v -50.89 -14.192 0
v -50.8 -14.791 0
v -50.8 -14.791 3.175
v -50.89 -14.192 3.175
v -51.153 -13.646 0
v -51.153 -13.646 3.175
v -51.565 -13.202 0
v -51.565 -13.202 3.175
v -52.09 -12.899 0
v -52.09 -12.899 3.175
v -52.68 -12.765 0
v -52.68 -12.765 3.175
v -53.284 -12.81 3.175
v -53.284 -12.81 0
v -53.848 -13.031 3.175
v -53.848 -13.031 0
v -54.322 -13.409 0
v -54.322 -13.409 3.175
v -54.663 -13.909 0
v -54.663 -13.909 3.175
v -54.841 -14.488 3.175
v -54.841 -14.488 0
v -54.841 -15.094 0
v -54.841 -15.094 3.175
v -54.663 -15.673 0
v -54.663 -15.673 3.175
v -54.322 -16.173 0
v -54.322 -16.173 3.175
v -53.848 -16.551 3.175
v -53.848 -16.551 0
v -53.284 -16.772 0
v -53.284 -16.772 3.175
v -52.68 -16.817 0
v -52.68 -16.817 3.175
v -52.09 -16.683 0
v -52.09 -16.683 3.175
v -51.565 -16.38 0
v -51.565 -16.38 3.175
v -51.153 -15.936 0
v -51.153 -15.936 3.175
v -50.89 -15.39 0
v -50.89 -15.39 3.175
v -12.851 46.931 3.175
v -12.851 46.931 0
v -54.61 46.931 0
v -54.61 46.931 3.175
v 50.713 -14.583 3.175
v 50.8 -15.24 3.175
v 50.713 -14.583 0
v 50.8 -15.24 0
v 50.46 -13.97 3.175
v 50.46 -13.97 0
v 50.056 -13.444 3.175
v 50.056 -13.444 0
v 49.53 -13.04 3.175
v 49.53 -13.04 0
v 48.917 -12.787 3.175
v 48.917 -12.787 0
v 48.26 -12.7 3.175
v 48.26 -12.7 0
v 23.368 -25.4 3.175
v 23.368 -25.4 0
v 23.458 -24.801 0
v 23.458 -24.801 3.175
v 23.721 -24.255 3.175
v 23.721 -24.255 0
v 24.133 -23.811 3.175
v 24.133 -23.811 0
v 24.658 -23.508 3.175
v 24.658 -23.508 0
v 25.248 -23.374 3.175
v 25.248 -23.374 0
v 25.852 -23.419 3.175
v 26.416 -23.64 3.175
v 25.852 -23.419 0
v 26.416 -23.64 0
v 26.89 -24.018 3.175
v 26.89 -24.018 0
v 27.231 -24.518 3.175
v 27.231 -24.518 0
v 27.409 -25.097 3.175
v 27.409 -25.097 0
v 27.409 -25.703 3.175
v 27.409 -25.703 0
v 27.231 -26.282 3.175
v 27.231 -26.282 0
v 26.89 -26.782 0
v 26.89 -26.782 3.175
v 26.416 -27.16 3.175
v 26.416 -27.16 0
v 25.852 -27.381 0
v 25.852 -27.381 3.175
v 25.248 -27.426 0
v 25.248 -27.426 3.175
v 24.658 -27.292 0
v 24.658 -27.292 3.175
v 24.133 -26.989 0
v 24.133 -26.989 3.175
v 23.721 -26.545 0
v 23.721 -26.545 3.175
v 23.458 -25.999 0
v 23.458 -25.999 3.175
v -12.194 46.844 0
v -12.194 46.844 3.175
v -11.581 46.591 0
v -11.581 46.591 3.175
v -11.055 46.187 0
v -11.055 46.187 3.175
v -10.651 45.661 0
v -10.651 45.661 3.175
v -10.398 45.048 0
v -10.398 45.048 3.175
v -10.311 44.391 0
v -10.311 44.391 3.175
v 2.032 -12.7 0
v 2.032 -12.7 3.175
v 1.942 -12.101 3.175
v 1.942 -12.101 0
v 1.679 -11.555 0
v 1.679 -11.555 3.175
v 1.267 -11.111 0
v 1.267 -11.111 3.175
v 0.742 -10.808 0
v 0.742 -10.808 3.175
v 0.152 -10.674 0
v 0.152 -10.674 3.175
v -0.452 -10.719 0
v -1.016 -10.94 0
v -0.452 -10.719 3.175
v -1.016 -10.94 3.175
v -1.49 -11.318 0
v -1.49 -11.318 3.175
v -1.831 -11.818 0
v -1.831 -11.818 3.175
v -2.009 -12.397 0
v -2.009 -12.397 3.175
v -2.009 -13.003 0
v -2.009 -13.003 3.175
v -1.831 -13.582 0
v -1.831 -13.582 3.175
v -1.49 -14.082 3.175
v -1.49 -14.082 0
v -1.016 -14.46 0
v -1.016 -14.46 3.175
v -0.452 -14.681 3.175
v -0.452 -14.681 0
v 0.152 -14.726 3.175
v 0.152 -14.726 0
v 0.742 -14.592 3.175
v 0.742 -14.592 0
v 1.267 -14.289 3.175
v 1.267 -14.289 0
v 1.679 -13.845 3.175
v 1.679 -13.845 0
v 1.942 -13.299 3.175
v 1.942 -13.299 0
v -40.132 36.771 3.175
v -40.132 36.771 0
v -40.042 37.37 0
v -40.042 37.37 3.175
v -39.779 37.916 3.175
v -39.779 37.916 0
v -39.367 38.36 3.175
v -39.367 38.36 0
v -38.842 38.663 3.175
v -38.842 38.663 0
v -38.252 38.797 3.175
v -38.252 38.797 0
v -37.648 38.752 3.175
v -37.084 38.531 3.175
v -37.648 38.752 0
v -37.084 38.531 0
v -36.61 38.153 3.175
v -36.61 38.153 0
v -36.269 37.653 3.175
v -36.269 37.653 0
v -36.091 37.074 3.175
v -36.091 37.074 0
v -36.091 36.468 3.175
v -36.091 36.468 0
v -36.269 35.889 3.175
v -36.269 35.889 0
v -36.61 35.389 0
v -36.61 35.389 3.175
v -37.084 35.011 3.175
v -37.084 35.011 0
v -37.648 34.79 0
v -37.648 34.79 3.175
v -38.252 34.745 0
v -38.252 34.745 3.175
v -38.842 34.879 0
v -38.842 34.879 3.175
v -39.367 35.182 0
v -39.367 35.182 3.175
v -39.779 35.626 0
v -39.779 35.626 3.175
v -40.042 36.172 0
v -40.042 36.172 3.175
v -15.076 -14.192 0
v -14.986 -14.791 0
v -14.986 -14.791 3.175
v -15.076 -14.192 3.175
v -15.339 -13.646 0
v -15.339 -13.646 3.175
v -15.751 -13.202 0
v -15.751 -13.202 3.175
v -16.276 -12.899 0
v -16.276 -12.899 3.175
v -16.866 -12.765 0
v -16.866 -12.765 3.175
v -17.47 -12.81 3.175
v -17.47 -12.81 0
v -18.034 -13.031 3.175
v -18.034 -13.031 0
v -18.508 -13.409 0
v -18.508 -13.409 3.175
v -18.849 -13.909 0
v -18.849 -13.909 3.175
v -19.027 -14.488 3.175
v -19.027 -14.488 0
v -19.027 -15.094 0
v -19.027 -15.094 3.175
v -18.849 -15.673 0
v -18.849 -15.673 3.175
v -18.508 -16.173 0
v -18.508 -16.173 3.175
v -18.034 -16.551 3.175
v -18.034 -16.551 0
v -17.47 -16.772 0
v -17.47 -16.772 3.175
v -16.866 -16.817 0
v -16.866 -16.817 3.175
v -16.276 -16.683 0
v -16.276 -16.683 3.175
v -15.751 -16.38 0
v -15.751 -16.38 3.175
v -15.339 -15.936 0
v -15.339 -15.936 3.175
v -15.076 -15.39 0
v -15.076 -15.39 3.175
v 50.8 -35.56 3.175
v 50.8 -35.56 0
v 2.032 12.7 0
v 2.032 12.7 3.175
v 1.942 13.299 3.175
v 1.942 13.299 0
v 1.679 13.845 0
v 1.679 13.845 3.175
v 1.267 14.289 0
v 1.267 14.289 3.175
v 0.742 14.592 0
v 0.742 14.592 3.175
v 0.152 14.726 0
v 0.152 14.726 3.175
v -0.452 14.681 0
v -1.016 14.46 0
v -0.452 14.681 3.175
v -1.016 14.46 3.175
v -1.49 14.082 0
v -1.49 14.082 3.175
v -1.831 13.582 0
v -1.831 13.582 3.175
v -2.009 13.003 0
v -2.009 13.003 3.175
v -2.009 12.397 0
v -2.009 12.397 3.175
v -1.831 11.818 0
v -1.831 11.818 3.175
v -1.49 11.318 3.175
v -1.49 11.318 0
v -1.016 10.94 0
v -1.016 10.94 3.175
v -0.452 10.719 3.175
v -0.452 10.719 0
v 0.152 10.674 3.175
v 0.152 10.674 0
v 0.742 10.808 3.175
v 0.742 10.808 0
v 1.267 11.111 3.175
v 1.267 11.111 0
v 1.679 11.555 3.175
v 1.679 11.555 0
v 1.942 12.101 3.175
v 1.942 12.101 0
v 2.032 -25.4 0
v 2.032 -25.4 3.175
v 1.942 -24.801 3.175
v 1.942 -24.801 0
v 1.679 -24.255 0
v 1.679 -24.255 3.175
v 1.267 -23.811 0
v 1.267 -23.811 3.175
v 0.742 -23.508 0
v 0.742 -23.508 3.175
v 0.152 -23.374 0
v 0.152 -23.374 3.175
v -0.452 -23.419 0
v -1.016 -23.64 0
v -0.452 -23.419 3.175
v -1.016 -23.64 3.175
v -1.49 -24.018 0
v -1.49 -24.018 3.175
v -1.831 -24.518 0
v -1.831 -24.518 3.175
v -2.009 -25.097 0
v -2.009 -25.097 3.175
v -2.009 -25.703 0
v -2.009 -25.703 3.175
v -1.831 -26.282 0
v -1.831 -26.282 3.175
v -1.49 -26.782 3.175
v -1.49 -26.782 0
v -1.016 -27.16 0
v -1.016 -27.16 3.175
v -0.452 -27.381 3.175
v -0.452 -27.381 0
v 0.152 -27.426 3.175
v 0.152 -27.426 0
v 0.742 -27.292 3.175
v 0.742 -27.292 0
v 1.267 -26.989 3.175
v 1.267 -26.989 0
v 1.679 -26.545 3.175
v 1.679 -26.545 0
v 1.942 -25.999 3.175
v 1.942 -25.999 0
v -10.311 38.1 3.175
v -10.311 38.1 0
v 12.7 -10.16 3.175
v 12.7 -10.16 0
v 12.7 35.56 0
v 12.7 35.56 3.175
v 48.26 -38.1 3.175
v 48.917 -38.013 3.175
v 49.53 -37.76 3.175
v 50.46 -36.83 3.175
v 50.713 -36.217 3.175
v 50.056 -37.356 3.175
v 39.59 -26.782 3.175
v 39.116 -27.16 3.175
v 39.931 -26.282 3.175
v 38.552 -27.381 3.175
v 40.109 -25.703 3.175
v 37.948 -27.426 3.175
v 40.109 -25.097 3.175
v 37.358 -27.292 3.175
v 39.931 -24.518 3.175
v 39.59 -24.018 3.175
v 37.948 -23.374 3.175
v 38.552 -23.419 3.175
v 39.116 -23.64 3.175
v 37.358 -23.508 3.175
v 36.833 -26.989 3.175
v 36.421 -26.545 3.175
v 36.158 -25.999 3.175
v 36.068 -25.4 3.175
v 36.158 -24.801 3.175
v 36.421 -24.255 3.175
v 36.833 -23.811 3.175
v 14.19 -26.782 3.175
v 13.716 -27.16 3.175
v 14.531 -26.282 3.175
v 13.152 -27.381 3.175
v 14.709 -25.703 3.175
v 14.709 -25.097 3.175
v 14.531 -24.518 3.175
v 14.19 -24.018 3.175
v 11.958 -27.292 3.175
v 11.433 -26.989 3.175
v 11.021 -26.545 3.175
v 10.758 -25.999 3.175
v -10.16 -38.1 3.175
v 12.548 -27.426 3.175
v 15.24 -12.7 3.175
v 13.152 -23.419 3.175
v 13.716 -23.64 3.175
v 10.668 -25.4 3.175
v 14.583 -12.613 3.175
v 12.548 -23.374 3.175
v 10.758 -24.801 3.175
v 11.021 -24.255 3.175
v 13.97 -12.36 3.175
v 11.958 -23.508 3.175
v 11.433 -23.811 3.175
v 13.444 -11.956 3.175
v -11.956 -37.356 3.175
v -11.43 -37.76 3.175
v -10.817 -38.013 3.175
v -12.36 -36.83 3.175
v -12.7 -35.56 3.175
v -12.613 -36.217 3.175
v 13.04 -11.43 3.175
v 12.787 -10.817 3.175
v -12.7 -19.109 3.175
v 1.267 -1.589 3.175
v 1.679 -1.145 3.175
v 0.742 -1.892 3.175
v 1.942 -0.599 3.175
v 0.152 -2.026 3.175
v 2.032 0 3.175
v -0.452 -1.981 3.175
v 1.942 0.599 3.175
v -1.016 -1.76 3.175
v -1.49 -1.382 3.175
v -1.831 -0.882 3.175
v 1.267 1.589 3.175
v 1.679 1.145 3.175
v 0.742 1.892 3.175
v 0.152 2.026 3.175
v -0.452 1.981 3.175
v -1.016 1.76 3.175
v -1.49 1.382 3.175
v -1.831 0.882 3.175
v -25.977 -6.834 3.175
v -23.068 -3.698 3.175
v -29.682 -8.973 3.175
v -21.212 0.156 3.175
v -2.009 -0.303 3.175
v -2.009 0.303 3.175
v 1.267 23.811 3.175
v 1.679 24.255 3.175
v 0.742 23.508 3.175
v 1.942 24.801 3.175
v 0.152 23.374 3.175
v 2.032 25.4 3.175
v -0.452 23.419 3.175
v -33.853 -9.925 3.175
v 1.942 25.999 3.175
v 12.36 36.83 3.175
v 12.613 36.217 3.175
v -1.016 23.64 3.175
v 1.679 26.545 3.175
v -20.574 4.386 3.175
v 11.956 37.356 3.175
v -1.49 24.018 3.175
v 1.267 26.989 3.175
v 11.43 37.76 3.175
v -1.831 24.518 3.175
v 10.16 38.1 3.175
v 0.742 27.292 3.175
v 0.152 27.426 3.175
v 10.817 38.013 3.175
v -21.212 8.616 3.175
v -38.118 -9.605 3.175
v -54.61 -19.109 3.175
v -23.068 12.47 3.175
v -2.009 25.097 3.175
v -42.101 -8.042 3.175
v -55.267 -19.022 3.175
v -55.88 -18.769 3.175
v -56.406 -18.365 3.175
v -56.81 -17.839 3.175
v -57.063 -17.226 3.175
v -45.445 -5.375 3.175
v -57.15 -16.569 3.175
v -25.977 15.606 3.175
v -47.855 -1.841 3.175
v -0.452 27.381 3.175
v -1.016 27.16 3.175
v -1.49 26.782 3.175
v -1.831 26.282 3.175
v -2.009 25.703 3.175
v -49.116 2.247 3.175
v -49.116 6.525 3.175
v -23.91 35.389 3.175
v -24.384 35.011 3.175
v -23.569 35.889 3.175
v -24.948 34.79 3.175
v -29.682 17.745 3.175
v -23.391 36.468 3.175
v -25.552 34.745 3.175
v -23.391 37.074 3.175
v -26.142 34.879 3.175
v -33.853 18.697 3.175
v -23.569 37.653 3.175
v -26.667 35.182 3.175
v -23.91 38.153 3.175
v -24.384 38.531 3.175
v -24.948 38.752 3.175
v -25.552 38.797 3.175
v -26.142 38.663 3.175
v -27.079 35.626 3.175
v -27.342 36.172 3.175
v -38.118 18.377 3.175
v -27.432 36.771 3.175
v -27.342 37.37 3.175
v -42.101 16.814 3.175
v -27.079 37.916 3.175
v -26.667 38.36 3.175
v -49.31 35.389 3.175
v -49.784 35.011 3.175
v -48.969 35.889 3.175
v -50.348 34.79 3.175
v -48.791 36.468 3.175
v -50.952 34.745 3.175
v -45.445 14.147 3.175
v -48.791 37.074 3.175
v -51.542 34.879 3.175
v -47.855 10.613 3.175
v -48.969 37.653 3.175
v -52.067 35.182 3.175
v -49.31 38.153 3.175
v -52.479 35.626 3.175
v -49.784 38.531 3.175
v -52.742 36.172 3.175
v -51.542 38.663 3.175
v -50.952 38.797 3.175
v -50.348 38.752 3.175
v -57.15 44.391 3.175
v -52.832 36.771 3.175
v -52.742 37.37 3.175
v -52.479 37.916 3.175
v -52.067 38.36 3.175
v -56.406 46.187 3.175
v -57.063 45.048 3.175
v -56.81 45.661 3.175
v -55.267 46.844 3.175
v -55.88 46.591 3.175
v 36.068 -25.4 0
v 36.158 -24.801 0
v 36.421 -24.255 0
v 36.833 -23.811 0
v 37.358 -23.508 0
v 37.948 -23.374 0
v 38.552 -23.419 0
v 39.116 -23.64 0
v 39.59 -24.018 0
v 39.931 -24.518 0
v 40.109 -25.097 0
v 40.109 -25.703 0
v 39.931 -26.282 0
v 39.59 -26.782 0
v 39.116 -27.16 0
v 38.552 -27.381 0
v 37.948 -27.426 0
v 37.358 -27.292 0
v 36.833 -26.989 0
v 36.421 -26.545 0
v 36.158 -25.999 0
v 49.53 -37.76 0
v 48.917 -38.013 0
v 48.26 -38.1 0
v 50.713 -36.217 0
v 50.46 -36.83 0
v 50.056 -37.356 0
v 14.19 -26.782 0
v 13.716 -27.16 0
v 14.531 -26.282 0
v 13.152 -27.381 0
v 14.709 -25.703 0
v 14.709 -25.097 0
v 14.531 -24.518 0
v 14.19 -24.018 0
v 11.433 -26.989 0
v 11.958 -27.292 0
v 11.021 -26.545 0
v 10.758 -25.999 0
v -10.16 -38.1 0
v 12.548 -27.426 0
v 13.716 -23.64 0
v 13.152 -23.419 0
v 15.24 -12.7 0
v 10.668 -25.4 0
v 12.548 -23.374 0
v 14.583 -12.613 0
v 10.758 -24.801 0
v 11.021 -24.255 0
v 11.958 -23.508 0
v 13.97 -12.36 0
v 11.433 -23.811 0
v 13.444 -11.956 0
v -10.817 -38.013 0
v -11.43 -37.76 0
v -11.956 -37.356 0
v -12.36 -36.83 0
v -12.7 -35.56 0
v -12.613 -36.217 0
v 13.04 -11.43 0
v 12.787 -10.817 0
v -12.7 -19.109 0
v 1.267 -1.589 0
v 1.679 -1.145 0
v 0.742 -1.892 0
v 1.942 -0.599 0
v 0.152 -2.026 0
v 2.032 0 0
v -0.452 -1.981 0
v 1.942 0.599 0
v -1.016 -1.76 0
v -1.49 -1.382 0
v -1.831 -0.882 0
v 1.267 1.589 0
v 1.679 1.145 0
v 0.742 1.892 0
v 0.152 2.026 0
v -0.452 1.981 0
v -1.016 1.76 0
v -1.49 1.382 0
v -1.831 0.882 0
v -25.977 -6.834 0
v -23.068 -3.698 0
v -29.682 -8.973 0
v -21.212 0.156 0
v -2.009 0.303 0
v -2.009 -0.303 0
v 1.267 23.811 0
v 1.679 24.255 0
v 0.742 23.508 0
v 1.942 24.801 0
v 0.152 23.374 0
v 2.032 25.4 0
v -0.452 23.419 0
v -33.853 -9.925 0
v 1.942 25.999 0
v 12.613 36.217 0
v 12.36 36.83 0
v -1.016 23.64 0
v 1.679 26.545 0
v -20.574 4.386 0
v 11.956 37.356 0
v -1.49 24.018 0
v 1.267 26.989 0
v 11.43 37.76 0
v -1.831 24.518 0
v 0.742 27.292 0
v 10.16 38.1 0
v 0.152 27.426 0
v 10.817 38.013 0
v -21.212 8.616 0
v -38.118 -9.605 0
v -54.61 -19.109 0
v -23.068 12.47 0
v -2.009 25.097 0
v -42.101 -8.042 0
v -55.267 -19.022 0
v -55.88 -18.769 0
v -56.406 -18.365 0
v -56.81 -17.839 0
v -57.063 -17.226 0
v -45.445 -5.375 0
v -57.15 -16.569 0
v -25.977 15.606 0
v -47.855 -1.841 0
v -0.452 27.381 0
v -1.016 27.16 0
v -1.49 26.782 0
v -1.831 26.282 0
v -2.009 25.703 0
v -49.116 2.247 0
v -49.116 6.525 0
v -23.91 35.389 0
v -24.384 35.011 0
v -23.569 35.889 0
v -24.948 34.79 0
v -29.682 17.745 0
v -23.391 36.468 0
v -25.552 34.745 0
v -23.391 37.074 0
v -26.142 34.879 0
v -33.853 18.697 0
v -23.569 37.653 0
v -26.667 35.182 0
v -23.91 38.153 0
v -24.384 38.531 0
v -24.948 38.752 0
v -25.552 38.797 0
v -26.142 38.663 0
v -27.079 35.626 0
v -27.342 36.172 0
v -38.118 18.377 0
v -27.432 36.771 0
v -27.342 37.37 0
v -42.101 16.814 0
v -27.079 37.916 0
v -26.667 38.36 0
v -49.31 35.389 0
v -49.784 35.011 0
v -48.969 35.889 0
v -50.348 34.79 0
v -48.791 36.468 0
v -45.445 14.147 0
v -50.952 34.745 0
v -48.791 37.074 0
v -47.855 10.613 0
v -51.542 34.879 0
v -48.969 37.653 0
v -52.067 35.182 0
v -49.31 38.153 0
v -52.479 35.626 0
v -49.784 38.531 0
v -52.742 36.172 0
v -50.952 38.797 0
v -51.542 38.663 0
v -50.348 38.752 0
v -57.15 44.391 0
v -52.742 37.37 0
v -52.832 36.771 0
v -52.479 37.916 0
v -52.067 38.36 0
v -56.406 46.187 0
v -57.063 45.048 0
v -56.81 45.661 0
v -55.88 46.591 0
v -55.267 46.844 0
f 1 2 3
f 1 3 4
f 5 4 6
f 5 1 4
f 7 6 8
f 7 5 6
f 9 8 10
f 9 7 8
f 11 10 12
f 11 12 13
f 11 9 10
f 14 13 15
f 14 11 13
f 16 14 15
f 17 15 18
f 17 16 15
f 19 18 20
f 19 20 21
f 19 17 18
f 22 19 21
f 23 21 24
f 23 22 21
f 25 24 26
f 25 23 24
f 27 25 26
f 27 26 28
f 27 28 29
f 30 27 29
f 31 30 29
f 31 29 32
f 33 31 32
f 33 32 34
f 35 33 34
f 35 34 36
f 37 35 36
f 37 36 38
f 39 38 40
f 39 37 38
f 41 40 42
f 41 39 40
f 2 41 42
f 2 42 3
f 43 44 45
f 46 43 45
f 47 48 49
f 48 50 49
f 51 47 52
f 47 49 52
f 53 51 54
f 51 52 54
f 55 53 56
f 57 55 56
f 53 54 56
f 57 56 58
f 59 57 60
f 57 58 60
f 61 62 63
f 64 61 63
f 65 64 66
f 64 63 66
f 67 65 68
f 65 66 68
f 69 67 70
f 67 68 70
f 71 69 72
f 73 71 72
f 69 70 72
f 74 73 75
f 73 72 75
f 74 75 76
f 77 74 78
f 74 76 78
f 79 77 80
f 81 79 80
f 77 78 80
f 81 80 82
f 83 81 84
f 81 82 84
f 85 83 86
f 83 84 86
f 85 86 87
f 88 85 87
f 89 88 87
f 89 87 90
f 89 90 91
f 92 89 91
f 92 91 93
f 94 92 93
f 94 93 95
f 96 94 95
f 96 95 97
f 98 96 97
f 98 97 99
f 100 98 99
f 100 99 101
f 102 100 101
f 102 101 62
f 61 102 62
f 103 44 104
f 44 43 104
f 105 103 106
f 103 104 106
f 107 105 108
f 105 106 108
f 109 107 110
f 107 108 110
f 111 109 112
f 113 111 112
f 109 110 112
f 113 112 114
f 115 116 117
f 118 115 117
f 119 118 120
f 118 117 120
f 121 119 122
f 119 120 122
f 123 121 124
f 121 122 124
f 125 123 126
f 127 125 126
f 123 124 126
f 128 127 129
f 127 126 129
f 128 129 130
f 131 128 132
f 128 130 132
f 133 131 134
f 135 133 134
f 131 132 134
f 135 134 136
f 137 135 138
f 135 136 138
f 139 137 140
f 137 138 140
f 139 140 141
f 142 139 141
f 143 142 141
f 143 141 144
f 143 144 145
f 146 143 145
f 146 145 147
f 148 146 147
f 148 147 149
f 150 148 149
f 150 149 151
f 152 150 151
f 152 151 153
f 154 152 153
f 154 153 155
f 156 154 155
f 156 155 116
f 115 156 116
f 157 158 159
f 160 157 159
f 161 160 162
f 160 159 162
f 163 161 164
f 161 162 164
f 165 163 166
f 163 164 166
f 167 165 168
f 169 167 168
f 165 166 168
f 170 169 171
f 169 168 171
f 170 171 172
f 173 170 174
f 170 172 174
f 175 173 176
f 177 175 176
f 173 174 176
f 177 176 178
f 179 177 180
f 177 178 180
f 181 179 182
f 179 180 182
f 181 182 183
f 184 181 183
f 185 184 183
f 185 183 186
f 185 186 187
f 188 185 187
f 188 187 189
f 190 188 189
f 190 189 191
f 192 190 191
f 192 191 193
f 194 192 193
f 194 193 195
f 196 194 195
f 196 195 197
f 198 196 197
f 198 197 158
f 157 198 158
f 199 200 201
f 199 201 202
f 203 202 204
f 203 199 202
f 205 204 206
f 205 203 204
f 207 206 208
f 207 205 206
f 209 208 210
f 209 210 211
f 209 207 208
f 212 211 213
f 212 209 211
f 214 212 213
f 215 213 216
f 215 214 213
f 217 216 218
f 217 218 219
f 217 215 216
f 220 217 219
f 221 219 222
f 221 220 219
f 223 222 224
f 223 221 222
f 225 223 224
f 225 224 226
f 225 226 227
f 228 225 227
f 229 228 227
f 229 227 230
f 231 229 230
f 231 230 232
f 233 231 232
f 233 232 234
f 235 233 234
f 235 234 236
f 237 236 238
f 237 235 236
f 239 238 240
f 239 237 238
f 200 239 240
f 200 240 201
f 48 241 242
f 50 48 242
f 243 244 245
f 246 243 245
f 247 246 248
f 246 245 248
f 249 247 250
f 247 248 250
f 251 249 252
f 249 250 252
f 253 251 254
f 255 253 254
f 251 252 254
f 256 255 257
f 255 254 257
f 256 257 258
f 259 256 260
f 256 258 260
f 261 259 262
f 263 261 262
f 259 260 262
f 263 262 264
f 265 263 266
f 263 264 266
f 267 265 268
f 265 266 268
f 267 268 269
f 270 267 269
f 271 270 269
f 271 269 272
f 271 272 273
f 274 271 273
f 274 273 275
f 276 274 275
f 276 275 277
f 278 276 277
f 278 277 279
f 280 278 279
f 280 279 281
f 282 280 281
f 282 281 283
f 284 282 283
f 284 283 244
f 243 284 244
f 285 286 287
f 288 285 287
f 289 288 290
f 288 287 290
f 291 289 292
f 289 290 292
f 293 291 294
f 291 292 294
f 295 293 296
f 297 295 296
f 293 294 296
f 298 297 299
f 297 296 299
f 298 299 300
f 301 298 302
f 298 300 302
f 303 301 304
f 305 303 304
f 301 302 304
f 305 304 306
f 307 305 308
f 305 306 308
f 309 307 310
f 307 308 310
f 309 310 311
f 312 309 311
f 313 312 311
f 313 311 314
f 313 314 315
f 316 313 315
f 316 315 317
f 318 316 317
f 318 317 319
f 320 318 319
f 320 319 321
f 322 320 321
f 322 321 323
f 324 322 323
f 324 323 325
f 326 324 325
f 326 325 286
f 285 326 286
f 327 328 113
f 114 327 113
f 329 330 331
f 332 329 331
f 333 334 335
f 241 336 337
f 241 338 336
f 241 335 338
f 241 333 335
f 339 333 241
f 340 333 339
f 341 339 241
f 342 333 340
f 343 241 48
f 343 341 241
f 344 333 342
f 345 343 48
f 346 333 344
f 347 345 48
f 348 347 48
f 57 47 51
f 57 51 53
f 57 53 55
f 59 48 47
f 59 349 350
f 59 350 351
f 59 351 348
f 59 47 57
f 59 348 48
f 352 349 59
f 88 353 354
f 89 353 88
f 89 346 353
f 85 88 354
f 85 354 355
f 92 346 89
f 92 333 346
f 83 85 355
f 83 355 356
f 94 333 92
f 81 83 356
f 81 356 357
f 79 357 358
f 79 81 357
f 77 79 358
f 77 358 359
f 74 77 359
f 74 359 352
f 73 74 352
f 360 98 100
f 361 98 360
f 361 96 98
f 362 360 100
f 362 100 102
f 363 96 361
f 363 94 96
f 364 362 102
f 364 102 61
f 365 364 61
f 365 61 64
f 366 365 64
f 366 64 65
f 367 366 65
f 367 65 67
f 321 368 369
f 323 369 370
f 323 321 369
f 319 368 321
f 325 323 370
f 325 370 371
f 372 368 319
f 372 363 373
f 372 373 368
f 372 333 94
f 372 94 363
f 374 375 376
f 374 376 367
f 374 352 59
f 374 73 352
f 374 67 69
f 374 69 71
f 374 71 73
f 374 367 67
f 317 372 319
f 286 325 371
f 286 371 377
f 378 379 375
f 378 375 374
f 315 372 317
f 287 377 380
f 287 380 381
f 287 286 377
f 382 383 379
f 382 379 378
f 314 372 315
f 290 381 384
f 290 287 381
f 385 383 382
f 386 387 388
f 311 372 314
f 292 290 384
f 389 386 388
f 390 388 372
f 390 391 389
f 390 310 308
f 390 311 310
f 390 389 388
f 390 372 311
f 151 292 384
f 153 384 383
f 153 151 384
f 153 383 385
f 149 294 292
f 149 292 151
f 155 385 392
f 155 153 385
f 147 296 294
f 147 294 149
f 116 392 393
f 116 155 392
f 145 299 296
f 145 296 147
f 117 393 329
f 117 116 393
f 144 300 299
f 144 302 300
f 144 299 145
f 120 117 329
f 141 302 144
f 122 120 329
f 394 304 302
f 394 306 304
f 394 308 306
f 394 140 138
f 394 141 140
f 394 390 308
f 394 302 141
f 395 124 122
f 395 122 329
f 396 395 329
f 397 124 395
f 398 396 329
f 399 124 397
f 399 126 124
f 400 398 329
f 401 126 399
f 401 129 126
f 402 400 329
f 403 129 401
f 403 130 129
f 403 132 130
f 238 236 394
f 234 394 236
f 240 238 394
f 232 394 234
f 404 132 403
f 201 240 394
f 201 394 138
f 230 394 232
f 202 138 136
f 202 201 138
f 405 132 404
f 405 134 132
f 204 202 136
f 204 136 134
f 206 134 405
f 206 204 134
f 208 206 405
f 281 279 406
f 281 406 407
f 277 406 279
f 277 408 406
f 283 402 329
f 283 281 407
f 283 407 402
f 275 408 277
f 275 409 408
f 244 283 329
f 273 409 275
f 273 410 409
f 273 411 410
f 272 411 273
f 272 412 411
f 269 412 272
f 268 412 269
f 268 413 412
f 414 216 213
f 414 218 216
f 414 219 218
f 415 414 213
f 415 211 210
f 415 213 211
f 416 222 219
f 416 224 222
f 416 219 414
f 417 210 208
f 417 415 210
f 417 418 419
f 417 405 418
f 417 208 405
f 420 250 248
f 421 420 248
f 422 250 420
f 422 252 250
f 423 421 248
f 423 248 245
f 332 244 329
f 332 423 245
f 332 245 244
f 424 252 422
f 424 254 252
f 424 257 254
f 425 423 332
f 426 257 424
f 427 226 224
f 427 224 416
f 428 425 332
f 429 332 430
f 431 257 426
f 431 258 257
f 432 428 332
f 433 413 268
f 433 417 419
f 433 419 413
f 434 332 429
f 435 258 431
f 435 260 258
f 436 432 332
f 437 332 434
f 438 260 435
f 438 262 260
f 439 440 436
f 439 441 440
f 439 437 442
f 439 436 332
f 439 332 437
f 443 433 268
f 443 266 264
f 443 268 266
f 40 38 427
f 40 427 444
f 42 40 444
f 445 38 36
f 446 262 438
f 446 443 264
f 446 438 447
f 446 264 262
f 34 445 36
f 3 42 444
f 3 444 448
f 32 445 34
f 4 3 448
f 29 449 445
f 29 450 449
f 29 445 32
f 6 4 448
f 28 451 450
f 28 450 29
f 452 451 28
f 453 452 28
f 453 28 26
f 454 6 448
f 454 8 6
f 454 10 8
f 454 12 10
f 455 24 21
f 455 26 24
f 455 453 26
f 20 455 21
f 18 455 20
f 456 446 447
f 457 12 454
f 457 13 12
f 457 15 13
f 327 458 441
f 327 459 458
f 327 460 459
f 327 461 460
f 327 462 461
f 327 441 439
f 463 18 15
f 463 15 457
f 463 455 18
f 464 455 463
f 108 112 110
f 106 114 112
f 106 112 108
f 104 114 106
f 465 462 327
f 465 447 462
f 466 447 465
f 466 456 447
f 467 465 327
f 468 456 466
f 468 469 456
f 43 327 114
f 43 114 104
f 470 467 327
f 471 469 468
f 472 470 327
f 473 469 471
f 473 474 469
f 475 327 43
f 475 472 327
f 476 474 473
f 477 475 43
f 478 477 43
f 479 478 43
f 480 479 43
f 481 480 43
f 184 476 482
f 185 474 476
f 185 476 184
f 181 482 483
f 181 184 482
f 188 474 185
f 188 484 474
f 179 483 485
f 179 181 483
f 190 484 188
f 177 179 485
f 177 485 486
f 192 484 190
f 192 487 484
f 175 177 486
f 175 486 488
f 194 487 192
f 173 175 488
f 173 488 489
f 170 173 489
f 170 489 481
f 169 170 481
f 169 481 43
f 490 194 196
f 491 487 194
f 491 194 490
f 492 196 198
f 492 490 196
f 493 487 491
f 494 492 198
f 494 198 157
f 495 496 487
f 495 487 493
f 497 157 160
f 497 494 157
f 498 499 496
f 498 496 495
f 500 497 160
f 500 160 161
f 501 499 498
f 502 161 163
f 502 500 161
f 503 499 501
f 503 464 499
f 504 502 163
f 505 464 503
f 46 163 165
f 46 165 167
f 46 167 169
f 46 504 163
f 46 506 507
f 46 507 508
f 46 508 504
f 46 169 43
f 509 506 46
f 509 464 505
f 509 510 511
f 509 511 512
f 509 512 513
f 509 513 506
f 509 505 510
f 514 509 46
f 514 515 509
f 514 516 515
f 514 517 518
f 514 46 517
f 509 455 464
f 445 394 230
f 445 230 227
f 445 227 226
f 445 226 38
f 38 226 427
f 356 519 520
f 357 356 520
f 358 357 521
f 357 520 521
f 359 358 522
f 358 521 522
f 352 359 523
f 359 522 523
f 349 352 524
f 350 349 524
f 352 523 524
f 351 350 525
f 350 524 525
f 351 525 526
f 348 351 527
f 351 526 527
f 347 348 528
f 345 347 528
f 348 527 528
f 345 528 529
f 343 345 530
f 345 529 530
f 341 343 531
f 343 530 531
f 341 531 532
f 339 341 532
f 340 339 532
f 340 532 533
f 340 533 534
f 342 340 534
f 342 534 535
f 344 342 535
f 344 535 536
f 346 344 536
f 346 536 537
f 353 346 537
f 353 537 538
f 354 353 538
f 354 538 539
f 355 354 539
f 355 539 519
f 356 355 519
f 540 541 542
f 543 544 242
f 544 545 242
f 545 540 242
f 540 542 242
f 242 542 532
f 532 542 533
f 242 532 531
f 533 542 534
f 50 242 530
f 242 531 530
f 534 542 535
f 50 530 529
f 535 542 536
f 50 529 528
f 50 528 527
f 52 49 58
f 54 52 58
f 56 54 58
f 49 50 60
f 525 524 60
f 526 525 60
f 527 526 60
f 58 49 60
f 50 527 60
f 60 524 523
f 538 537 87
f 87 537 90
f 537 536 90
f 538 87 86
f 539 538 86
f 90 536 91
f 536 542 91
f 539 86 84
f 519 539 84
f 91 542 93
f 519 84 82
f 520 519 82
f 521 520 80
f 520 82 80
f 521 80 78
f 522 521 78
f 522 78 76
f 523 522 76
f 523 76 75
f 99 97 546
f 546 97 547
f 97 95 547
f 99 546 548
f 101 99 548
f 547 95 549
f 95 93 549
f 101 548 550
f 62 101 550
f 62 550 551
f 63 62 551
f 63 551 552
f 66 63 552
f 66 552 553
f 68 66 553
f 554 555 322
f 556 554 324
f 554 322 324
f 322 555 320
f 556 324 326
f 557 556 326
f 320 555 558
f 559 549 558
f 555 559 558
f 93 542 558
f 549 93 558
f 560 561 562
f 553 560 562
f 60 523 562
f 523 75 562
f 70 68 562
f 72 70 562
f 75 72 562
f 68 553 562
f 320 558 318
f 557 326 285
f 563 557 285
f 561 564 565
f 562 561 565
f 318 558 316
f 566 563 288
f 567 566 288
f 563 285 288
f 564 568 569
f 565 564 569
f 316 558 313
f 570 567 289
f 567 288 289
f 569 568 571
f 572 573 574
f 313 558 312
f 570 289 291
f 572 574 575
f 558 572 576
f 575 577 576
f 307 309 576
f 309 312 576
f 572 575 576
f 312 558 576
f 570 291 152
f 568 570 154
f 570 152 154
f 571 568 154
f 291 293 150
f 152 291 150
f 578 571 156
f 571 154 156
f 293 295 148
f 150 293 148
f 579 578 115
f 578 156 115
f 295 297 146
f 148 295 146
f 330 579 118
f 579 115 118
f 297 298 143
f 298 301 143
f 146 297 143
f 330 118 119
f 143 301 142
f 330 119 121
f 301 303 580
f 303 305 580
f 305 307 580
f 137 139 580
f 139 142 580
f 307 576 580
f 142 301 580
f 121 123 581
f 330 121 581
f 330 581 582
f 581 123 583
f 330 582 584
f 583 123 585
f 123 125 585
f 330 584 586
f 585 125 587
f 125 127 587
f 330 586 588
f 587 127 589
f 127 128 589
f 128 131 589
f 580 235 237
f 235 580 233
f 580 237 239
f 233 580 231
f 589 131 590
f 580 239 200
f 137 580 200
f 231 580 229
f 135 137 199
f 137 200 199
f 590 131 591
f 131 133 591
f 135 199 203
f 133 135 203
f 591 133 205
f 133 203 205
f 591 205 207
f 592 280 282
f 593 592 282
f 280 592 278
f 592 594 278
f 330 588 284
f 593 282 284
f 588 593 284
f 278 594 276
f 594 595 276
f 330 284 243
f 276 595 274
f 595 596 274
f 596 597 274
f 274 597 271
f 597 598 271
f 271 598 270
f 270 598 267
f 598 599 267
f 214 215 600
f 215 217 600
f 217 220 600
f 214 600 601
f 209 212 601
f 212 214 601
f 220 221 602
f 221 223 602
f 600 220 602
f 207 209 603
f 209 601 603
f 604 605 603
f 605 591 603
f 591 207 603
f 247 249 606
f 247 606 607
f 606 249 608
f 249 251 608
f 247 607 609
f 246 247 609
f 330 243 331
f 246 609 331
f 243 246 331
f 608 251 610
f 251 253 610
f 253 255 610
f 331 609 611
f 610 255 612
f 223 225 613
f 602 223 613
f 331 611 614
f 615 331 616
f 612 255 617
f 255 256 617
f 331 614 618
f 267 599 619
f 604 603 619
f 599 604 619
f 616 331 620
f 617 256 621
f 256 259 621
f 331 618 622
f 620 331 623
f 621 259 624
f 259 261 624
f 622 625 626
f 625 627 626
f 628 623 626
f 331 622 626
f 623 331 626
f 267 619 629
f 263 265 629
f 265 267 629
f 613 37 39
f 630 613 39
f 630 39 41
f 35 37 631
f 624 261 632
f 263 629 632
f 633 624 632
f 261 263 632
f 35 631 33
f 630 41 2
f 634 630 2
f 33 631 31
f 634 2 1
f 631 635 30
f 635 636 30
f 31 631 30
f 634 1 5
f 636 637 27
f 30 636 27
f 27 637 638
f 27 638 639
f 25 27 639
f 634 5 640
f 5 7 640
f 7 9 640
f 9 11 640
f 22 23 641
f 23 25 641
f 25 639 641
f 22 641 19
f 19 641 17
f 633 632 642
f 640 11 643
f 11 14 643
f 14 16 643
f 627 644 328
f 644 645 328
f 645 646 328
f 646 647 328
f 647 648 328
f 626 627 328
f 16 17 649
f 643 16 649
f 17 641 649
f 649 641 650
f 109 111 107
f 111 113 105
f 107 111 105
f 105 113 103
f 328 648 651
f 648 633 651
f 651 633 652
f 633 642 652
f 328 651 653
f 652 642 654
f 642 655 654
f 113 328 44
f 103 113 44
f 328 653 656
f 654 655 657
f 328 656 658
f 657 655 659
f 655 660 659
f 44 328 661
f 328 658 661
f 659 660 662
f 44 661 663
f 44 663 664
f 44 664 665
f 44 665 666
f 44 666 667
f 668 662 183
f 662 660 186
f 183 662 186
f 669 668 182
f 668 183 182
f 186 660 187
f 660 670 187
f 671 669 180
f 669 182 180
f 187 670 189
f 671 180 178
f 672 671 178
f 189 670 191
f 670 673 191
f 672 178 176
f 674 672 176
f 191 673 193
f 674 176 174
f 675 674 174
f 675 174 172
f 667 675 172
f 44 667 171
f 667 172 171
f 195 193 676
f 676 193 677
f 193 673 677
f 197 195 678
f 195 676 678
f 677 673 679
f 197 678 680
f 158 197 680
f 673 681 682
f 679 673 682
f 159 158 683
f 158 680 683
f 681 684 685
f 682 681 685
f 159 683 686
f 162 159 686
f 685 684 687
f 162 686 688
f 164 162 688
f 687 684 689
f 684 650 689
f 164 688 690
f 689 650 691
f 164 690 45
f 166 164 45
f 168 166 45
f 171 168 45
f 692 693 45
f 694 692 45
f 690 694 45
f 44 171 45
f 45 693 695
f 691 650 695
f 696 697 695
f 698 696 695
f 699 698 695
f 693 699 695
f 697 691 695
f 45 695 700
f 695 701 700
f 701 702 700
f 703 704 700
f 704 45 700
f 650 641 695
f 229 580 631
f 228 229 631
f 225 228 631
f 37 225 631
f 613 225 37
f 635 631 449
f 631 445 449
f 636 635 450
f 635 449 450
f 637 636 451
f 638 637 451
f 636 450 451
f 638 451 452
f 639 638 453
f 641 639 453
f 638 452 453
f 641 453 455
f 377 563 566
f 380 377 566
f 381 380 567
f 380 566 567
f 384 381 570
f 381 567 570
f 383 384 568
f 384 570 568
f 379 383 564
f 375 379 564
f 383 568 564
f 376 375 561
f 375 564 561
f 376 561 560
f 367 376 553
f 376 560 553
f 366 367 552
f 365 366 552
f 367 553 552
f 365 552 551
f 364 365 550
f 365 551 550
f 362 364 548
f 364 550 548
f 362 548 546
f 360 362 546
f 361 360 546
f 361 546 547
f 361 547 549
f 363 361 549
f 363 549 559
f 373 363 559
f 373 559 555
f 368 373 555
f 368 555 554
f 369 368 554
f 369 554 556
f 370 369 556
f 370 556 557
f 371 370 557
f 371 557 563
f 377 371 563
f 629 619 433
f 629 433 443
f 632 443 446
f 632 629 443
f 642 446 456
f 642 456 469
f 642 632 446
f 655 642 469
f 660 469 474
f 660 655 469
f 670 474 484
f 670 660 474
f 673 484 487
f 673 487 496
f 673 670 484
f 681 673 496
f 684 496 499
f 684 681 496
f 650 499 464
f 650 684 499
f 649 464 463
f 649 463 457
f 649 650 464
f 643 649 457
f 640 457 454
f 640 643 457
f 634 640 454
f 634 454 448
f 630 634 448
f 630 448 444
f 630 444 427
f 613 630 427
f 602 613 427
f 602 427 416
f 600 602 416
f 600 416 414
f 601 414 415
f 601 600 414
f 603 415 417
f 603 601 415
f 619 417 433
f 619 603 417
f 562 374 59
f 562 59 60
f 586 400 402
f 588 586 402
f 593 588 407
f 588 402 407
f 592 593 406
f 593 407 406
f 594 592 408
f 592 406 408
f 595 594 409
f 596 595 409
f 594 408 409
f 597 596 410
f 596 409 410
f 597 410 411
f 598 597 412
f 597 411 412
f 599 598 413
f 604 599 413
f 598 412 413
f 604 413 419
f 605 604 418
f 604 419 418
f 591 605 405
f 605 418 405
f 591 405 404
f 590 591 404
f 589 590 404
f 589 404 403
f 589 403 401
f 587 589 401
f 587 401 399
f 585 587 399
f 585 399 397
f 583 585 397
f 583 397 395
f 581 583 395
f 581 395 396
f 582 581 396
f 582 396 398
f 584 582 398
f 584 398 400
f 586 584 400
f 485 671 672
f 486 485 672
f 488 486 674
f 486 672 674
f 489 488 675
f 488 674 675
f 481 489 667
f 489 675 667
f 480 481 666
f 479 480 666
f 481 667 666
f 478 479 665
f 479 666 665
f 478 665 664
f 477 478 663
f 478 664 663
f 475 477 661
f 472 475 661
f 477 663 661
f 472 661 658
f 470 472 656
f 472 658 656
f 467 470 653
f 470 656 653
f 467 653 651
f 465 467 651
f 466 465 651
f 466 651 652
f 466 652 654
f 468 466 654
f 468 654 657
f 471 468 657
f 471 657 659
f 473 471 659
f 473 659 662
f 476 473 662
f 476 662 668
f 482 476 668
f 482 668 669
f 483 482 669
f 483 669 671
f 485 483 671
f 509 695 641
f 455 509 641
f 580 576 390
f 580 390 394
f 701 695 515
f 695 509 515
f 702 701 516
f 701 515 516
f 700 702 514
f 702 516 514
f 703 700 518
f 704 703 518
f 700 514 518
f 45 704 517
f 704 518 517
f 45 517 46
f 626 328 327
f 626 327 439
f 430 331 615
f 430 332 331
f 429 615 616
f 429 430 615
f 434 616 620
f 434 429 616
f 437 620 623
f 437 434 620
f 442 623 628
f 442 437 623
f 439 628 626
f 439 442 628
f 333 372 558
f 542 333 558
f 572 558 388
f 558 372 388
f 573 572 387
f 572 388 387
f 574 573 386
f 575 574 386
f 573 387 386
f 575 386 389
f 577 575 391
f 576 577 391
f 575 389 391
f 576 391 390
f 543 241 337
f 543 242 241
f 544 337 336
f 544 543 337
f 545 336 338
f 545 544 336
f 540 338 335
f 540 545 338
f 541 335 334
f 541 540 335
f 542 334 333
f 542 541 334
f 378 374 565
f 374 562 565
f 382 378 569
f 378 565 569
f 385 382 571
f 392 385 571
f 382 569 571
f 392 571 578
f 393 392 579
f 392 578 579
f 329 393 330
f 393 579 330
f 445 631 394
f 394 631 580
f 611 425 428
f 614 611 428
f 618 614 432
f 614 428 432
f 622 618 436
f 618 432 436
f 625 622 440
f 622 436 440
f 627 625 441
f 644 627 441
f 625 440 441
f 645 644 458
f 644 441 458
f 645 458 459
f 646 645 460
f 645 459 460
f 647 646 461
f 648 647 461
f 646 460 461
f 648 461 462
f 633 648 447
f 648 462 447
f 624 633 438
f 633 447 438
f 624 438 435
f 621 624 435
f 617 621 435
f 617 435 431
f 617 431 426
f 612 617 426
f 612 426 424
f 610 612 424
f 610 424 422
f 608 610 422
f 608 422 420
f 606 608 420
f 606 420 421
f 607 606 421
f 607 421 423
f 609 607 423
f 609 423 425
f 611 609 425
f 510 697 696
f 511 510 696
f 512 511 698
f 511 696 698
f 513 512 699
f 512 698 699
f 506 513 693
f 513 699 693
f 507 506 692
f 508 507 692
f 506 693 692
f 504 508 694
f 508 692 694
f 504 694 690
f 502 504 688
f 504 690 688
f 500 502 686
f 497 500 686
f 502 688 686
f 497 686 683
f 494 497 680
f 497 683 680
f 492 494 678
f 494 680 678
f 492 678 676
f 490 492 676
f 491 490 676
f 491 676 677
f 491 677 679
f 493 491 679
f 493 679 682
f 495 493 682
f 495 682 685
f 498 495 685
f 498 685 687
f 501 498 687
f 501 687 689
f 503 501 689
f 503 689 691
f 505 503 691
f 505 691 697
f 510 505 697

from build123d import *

# Parameters (mm, degrees)
SKETCH1_R           = 2.032
SKETCH1_R_2         = 14.351
SKETCH1_W           = 25.4
SKETCH1_H           = 76.2
BOSS_EXTRUDE1_DEPTH = 3.175
SKETCH2_R           = 2.032
CUT_EXTRUDE1_DEPTH  = 69.759094853
SKETCH4_W           = 3.175
SKETCH4_H           = 25.4
BOSS_EXTRUDE2_DEPTH = 38.1
SKETCH5_R           = 2.032
CUT_EXTRUDE2_DEPTH  = 69.759094853
FILLET5_R           = 2.54
SKETCH6_W           = 46.838855708
SKETCH6_H           = 19.05
BOSS_EXTRUDE3_DEPTH = 3.175
SKETCH7_R           = 2.032
CUT_EXTRUDE3_DEPTH  = 75.018388912
FILLET6_R           = 2.54


with BuildPart() as part:
    # Sketch1 → Boss-Extrude1 (new body)
    # profile 1 of 2: a face of its own
    with BuildSketch(Plane.XY):
        Polygon((-57.15, -19.108999882), (-12.7, -19.108999882), (-12.7, 24.638), (-12.7, 27.881000118), (-57.15, 27.881000118), align=None)
        with Locations((-52.832, -14.790999882)):
            Circle(SKETCH1_R, mode=Mode.SUBTRACT)
        with Locations((-17.018, -14.790999882)):
            Circle(SKETCH1_R, mode=Mode.SUBTRACT)
        with Locations((-34.925, 4.386000118)):
            Circle(SKETCH1_R_2, mode=Mode.SUBTRACT)
    # profile 2 of 2: a face of its own
    with BuildSketch(Plane.XY):
        Rectangle(SKETCH1_W, SKETCH1_H)
    extrude(amount=BOSS_EXTRUDE1_DEPTH)

    # Sketch2 → Cut-Extrude1 (cut, through all)
    with BuildSketch(Plane.XY.offset(3.175)):
        Circle(SKETCH2_R)
        with Locations((0, 12.7)):
            Circle(SKETCH2_R)
        with Locations((0, 25.4)):
            Circle(SKETCH2_R)
        with Locations((0, -12.7)):
            Circle(SKETCH2_R)
        with Locations((0, -25.4)):
            Circle(SKETCH2_R)
    extrude(amount=-CUT_EXTRUDE1_DEPTH, mode=Mode.SUBTRACT)

    # Sketch4 → Boss-Extrude2 (add)
    with BuildSketch(Plane(origin=(12.7, 0, 0), x_dir=(0, 0, -1), z_dir=(1, 0, 0))):
        with Locations((-1.5875, -25.4)):
            Rectangle(SKETCH4_W, SKETCH4_H)
    extrude(amount=BOSS_EXTRUDE2_DEPTH)

    # Sketch5 → Cut-Extrude2 (cut, through all)
    with BuildSketch(Plane(origin=(0, 0, 0), x_dir=(-1, 0, 0), z_dir=(0, 0, -1))):
        with Locations(Location((0, -25.4, 0), (0, 0, 180))):
            Circle(SKETCH5_R)
        with Locations((-12.7, -25.4)):
            Circle(SKETCH5_R)
        with Locations((-25.4, -25.4)):
            Circle(SKETCH5_R)
        with Locations((-38.1, -25.4)):
            Circle(SKETCH5_R)
    extrude(amount=-CUT_EXTRUDE2_DEPTH, mode=Mode.SUBTRACT)

    # Fillet5
    fillet5_edges = [part.edges().sort_by_distance(p)[0] for p in [
        (12.7, 38.1, 1.5875),
        (-12.7, -38.1, 1.5875),
        (-57.15, -19.108999882, 1.5875),
        (12.7, -12.7, 1.5875),
        (50.8, -38.1, 1.5875),
        (50.8, -12.7, 1.5875),
    ]]
    fillet(fillet5_edges, radius=FILLET5_R)

    # Sketch6 → Boss-Extrude3 (add)
    with BuildSketch(Plane(origin=(0, 0, 0), x_dir=(-1, 0, 0), z_dir=(0, 0, -1))):
        with Locations((33.730572146, 37.406000118)):
            Rectangle(SKETCH6_W, SKETCH6_H)
    extrude(amount=-BOSS_EXTRUDE3_DEPTH)

    # Sketch7 → Cut-Extrude3 (cut, through all)
    with BuildSketch(Plane(origin=(0, 0, 0), x_dir=(-1, 0, 0), z_dir=(0, 0, -1))):
        with Locations((25.4, 36.771000118)):
            Circle(SKETCH7_R)
        with Locations((38.1, 36.771000118)):
            Circle(SKETCH7_R)
        with Locations((50.8, 36.771000118)):
            Circle(SKETCH7_R)
    extrude(amount=-CUT_EXTRUDE3_DEPTH, mode=Mode.SUBTRACT)

    # Fillet6
    fillet6_edges = [part.edges().sort_by_distance(p)[0] for p in [
        (-10.311144292, 46.931000118, 1.5875),
        (-57.15, 46.931000118, 1.5875),
    ]]
    fillet(fillet6_edges, radius=FILLET6_R)


solid = part.part
